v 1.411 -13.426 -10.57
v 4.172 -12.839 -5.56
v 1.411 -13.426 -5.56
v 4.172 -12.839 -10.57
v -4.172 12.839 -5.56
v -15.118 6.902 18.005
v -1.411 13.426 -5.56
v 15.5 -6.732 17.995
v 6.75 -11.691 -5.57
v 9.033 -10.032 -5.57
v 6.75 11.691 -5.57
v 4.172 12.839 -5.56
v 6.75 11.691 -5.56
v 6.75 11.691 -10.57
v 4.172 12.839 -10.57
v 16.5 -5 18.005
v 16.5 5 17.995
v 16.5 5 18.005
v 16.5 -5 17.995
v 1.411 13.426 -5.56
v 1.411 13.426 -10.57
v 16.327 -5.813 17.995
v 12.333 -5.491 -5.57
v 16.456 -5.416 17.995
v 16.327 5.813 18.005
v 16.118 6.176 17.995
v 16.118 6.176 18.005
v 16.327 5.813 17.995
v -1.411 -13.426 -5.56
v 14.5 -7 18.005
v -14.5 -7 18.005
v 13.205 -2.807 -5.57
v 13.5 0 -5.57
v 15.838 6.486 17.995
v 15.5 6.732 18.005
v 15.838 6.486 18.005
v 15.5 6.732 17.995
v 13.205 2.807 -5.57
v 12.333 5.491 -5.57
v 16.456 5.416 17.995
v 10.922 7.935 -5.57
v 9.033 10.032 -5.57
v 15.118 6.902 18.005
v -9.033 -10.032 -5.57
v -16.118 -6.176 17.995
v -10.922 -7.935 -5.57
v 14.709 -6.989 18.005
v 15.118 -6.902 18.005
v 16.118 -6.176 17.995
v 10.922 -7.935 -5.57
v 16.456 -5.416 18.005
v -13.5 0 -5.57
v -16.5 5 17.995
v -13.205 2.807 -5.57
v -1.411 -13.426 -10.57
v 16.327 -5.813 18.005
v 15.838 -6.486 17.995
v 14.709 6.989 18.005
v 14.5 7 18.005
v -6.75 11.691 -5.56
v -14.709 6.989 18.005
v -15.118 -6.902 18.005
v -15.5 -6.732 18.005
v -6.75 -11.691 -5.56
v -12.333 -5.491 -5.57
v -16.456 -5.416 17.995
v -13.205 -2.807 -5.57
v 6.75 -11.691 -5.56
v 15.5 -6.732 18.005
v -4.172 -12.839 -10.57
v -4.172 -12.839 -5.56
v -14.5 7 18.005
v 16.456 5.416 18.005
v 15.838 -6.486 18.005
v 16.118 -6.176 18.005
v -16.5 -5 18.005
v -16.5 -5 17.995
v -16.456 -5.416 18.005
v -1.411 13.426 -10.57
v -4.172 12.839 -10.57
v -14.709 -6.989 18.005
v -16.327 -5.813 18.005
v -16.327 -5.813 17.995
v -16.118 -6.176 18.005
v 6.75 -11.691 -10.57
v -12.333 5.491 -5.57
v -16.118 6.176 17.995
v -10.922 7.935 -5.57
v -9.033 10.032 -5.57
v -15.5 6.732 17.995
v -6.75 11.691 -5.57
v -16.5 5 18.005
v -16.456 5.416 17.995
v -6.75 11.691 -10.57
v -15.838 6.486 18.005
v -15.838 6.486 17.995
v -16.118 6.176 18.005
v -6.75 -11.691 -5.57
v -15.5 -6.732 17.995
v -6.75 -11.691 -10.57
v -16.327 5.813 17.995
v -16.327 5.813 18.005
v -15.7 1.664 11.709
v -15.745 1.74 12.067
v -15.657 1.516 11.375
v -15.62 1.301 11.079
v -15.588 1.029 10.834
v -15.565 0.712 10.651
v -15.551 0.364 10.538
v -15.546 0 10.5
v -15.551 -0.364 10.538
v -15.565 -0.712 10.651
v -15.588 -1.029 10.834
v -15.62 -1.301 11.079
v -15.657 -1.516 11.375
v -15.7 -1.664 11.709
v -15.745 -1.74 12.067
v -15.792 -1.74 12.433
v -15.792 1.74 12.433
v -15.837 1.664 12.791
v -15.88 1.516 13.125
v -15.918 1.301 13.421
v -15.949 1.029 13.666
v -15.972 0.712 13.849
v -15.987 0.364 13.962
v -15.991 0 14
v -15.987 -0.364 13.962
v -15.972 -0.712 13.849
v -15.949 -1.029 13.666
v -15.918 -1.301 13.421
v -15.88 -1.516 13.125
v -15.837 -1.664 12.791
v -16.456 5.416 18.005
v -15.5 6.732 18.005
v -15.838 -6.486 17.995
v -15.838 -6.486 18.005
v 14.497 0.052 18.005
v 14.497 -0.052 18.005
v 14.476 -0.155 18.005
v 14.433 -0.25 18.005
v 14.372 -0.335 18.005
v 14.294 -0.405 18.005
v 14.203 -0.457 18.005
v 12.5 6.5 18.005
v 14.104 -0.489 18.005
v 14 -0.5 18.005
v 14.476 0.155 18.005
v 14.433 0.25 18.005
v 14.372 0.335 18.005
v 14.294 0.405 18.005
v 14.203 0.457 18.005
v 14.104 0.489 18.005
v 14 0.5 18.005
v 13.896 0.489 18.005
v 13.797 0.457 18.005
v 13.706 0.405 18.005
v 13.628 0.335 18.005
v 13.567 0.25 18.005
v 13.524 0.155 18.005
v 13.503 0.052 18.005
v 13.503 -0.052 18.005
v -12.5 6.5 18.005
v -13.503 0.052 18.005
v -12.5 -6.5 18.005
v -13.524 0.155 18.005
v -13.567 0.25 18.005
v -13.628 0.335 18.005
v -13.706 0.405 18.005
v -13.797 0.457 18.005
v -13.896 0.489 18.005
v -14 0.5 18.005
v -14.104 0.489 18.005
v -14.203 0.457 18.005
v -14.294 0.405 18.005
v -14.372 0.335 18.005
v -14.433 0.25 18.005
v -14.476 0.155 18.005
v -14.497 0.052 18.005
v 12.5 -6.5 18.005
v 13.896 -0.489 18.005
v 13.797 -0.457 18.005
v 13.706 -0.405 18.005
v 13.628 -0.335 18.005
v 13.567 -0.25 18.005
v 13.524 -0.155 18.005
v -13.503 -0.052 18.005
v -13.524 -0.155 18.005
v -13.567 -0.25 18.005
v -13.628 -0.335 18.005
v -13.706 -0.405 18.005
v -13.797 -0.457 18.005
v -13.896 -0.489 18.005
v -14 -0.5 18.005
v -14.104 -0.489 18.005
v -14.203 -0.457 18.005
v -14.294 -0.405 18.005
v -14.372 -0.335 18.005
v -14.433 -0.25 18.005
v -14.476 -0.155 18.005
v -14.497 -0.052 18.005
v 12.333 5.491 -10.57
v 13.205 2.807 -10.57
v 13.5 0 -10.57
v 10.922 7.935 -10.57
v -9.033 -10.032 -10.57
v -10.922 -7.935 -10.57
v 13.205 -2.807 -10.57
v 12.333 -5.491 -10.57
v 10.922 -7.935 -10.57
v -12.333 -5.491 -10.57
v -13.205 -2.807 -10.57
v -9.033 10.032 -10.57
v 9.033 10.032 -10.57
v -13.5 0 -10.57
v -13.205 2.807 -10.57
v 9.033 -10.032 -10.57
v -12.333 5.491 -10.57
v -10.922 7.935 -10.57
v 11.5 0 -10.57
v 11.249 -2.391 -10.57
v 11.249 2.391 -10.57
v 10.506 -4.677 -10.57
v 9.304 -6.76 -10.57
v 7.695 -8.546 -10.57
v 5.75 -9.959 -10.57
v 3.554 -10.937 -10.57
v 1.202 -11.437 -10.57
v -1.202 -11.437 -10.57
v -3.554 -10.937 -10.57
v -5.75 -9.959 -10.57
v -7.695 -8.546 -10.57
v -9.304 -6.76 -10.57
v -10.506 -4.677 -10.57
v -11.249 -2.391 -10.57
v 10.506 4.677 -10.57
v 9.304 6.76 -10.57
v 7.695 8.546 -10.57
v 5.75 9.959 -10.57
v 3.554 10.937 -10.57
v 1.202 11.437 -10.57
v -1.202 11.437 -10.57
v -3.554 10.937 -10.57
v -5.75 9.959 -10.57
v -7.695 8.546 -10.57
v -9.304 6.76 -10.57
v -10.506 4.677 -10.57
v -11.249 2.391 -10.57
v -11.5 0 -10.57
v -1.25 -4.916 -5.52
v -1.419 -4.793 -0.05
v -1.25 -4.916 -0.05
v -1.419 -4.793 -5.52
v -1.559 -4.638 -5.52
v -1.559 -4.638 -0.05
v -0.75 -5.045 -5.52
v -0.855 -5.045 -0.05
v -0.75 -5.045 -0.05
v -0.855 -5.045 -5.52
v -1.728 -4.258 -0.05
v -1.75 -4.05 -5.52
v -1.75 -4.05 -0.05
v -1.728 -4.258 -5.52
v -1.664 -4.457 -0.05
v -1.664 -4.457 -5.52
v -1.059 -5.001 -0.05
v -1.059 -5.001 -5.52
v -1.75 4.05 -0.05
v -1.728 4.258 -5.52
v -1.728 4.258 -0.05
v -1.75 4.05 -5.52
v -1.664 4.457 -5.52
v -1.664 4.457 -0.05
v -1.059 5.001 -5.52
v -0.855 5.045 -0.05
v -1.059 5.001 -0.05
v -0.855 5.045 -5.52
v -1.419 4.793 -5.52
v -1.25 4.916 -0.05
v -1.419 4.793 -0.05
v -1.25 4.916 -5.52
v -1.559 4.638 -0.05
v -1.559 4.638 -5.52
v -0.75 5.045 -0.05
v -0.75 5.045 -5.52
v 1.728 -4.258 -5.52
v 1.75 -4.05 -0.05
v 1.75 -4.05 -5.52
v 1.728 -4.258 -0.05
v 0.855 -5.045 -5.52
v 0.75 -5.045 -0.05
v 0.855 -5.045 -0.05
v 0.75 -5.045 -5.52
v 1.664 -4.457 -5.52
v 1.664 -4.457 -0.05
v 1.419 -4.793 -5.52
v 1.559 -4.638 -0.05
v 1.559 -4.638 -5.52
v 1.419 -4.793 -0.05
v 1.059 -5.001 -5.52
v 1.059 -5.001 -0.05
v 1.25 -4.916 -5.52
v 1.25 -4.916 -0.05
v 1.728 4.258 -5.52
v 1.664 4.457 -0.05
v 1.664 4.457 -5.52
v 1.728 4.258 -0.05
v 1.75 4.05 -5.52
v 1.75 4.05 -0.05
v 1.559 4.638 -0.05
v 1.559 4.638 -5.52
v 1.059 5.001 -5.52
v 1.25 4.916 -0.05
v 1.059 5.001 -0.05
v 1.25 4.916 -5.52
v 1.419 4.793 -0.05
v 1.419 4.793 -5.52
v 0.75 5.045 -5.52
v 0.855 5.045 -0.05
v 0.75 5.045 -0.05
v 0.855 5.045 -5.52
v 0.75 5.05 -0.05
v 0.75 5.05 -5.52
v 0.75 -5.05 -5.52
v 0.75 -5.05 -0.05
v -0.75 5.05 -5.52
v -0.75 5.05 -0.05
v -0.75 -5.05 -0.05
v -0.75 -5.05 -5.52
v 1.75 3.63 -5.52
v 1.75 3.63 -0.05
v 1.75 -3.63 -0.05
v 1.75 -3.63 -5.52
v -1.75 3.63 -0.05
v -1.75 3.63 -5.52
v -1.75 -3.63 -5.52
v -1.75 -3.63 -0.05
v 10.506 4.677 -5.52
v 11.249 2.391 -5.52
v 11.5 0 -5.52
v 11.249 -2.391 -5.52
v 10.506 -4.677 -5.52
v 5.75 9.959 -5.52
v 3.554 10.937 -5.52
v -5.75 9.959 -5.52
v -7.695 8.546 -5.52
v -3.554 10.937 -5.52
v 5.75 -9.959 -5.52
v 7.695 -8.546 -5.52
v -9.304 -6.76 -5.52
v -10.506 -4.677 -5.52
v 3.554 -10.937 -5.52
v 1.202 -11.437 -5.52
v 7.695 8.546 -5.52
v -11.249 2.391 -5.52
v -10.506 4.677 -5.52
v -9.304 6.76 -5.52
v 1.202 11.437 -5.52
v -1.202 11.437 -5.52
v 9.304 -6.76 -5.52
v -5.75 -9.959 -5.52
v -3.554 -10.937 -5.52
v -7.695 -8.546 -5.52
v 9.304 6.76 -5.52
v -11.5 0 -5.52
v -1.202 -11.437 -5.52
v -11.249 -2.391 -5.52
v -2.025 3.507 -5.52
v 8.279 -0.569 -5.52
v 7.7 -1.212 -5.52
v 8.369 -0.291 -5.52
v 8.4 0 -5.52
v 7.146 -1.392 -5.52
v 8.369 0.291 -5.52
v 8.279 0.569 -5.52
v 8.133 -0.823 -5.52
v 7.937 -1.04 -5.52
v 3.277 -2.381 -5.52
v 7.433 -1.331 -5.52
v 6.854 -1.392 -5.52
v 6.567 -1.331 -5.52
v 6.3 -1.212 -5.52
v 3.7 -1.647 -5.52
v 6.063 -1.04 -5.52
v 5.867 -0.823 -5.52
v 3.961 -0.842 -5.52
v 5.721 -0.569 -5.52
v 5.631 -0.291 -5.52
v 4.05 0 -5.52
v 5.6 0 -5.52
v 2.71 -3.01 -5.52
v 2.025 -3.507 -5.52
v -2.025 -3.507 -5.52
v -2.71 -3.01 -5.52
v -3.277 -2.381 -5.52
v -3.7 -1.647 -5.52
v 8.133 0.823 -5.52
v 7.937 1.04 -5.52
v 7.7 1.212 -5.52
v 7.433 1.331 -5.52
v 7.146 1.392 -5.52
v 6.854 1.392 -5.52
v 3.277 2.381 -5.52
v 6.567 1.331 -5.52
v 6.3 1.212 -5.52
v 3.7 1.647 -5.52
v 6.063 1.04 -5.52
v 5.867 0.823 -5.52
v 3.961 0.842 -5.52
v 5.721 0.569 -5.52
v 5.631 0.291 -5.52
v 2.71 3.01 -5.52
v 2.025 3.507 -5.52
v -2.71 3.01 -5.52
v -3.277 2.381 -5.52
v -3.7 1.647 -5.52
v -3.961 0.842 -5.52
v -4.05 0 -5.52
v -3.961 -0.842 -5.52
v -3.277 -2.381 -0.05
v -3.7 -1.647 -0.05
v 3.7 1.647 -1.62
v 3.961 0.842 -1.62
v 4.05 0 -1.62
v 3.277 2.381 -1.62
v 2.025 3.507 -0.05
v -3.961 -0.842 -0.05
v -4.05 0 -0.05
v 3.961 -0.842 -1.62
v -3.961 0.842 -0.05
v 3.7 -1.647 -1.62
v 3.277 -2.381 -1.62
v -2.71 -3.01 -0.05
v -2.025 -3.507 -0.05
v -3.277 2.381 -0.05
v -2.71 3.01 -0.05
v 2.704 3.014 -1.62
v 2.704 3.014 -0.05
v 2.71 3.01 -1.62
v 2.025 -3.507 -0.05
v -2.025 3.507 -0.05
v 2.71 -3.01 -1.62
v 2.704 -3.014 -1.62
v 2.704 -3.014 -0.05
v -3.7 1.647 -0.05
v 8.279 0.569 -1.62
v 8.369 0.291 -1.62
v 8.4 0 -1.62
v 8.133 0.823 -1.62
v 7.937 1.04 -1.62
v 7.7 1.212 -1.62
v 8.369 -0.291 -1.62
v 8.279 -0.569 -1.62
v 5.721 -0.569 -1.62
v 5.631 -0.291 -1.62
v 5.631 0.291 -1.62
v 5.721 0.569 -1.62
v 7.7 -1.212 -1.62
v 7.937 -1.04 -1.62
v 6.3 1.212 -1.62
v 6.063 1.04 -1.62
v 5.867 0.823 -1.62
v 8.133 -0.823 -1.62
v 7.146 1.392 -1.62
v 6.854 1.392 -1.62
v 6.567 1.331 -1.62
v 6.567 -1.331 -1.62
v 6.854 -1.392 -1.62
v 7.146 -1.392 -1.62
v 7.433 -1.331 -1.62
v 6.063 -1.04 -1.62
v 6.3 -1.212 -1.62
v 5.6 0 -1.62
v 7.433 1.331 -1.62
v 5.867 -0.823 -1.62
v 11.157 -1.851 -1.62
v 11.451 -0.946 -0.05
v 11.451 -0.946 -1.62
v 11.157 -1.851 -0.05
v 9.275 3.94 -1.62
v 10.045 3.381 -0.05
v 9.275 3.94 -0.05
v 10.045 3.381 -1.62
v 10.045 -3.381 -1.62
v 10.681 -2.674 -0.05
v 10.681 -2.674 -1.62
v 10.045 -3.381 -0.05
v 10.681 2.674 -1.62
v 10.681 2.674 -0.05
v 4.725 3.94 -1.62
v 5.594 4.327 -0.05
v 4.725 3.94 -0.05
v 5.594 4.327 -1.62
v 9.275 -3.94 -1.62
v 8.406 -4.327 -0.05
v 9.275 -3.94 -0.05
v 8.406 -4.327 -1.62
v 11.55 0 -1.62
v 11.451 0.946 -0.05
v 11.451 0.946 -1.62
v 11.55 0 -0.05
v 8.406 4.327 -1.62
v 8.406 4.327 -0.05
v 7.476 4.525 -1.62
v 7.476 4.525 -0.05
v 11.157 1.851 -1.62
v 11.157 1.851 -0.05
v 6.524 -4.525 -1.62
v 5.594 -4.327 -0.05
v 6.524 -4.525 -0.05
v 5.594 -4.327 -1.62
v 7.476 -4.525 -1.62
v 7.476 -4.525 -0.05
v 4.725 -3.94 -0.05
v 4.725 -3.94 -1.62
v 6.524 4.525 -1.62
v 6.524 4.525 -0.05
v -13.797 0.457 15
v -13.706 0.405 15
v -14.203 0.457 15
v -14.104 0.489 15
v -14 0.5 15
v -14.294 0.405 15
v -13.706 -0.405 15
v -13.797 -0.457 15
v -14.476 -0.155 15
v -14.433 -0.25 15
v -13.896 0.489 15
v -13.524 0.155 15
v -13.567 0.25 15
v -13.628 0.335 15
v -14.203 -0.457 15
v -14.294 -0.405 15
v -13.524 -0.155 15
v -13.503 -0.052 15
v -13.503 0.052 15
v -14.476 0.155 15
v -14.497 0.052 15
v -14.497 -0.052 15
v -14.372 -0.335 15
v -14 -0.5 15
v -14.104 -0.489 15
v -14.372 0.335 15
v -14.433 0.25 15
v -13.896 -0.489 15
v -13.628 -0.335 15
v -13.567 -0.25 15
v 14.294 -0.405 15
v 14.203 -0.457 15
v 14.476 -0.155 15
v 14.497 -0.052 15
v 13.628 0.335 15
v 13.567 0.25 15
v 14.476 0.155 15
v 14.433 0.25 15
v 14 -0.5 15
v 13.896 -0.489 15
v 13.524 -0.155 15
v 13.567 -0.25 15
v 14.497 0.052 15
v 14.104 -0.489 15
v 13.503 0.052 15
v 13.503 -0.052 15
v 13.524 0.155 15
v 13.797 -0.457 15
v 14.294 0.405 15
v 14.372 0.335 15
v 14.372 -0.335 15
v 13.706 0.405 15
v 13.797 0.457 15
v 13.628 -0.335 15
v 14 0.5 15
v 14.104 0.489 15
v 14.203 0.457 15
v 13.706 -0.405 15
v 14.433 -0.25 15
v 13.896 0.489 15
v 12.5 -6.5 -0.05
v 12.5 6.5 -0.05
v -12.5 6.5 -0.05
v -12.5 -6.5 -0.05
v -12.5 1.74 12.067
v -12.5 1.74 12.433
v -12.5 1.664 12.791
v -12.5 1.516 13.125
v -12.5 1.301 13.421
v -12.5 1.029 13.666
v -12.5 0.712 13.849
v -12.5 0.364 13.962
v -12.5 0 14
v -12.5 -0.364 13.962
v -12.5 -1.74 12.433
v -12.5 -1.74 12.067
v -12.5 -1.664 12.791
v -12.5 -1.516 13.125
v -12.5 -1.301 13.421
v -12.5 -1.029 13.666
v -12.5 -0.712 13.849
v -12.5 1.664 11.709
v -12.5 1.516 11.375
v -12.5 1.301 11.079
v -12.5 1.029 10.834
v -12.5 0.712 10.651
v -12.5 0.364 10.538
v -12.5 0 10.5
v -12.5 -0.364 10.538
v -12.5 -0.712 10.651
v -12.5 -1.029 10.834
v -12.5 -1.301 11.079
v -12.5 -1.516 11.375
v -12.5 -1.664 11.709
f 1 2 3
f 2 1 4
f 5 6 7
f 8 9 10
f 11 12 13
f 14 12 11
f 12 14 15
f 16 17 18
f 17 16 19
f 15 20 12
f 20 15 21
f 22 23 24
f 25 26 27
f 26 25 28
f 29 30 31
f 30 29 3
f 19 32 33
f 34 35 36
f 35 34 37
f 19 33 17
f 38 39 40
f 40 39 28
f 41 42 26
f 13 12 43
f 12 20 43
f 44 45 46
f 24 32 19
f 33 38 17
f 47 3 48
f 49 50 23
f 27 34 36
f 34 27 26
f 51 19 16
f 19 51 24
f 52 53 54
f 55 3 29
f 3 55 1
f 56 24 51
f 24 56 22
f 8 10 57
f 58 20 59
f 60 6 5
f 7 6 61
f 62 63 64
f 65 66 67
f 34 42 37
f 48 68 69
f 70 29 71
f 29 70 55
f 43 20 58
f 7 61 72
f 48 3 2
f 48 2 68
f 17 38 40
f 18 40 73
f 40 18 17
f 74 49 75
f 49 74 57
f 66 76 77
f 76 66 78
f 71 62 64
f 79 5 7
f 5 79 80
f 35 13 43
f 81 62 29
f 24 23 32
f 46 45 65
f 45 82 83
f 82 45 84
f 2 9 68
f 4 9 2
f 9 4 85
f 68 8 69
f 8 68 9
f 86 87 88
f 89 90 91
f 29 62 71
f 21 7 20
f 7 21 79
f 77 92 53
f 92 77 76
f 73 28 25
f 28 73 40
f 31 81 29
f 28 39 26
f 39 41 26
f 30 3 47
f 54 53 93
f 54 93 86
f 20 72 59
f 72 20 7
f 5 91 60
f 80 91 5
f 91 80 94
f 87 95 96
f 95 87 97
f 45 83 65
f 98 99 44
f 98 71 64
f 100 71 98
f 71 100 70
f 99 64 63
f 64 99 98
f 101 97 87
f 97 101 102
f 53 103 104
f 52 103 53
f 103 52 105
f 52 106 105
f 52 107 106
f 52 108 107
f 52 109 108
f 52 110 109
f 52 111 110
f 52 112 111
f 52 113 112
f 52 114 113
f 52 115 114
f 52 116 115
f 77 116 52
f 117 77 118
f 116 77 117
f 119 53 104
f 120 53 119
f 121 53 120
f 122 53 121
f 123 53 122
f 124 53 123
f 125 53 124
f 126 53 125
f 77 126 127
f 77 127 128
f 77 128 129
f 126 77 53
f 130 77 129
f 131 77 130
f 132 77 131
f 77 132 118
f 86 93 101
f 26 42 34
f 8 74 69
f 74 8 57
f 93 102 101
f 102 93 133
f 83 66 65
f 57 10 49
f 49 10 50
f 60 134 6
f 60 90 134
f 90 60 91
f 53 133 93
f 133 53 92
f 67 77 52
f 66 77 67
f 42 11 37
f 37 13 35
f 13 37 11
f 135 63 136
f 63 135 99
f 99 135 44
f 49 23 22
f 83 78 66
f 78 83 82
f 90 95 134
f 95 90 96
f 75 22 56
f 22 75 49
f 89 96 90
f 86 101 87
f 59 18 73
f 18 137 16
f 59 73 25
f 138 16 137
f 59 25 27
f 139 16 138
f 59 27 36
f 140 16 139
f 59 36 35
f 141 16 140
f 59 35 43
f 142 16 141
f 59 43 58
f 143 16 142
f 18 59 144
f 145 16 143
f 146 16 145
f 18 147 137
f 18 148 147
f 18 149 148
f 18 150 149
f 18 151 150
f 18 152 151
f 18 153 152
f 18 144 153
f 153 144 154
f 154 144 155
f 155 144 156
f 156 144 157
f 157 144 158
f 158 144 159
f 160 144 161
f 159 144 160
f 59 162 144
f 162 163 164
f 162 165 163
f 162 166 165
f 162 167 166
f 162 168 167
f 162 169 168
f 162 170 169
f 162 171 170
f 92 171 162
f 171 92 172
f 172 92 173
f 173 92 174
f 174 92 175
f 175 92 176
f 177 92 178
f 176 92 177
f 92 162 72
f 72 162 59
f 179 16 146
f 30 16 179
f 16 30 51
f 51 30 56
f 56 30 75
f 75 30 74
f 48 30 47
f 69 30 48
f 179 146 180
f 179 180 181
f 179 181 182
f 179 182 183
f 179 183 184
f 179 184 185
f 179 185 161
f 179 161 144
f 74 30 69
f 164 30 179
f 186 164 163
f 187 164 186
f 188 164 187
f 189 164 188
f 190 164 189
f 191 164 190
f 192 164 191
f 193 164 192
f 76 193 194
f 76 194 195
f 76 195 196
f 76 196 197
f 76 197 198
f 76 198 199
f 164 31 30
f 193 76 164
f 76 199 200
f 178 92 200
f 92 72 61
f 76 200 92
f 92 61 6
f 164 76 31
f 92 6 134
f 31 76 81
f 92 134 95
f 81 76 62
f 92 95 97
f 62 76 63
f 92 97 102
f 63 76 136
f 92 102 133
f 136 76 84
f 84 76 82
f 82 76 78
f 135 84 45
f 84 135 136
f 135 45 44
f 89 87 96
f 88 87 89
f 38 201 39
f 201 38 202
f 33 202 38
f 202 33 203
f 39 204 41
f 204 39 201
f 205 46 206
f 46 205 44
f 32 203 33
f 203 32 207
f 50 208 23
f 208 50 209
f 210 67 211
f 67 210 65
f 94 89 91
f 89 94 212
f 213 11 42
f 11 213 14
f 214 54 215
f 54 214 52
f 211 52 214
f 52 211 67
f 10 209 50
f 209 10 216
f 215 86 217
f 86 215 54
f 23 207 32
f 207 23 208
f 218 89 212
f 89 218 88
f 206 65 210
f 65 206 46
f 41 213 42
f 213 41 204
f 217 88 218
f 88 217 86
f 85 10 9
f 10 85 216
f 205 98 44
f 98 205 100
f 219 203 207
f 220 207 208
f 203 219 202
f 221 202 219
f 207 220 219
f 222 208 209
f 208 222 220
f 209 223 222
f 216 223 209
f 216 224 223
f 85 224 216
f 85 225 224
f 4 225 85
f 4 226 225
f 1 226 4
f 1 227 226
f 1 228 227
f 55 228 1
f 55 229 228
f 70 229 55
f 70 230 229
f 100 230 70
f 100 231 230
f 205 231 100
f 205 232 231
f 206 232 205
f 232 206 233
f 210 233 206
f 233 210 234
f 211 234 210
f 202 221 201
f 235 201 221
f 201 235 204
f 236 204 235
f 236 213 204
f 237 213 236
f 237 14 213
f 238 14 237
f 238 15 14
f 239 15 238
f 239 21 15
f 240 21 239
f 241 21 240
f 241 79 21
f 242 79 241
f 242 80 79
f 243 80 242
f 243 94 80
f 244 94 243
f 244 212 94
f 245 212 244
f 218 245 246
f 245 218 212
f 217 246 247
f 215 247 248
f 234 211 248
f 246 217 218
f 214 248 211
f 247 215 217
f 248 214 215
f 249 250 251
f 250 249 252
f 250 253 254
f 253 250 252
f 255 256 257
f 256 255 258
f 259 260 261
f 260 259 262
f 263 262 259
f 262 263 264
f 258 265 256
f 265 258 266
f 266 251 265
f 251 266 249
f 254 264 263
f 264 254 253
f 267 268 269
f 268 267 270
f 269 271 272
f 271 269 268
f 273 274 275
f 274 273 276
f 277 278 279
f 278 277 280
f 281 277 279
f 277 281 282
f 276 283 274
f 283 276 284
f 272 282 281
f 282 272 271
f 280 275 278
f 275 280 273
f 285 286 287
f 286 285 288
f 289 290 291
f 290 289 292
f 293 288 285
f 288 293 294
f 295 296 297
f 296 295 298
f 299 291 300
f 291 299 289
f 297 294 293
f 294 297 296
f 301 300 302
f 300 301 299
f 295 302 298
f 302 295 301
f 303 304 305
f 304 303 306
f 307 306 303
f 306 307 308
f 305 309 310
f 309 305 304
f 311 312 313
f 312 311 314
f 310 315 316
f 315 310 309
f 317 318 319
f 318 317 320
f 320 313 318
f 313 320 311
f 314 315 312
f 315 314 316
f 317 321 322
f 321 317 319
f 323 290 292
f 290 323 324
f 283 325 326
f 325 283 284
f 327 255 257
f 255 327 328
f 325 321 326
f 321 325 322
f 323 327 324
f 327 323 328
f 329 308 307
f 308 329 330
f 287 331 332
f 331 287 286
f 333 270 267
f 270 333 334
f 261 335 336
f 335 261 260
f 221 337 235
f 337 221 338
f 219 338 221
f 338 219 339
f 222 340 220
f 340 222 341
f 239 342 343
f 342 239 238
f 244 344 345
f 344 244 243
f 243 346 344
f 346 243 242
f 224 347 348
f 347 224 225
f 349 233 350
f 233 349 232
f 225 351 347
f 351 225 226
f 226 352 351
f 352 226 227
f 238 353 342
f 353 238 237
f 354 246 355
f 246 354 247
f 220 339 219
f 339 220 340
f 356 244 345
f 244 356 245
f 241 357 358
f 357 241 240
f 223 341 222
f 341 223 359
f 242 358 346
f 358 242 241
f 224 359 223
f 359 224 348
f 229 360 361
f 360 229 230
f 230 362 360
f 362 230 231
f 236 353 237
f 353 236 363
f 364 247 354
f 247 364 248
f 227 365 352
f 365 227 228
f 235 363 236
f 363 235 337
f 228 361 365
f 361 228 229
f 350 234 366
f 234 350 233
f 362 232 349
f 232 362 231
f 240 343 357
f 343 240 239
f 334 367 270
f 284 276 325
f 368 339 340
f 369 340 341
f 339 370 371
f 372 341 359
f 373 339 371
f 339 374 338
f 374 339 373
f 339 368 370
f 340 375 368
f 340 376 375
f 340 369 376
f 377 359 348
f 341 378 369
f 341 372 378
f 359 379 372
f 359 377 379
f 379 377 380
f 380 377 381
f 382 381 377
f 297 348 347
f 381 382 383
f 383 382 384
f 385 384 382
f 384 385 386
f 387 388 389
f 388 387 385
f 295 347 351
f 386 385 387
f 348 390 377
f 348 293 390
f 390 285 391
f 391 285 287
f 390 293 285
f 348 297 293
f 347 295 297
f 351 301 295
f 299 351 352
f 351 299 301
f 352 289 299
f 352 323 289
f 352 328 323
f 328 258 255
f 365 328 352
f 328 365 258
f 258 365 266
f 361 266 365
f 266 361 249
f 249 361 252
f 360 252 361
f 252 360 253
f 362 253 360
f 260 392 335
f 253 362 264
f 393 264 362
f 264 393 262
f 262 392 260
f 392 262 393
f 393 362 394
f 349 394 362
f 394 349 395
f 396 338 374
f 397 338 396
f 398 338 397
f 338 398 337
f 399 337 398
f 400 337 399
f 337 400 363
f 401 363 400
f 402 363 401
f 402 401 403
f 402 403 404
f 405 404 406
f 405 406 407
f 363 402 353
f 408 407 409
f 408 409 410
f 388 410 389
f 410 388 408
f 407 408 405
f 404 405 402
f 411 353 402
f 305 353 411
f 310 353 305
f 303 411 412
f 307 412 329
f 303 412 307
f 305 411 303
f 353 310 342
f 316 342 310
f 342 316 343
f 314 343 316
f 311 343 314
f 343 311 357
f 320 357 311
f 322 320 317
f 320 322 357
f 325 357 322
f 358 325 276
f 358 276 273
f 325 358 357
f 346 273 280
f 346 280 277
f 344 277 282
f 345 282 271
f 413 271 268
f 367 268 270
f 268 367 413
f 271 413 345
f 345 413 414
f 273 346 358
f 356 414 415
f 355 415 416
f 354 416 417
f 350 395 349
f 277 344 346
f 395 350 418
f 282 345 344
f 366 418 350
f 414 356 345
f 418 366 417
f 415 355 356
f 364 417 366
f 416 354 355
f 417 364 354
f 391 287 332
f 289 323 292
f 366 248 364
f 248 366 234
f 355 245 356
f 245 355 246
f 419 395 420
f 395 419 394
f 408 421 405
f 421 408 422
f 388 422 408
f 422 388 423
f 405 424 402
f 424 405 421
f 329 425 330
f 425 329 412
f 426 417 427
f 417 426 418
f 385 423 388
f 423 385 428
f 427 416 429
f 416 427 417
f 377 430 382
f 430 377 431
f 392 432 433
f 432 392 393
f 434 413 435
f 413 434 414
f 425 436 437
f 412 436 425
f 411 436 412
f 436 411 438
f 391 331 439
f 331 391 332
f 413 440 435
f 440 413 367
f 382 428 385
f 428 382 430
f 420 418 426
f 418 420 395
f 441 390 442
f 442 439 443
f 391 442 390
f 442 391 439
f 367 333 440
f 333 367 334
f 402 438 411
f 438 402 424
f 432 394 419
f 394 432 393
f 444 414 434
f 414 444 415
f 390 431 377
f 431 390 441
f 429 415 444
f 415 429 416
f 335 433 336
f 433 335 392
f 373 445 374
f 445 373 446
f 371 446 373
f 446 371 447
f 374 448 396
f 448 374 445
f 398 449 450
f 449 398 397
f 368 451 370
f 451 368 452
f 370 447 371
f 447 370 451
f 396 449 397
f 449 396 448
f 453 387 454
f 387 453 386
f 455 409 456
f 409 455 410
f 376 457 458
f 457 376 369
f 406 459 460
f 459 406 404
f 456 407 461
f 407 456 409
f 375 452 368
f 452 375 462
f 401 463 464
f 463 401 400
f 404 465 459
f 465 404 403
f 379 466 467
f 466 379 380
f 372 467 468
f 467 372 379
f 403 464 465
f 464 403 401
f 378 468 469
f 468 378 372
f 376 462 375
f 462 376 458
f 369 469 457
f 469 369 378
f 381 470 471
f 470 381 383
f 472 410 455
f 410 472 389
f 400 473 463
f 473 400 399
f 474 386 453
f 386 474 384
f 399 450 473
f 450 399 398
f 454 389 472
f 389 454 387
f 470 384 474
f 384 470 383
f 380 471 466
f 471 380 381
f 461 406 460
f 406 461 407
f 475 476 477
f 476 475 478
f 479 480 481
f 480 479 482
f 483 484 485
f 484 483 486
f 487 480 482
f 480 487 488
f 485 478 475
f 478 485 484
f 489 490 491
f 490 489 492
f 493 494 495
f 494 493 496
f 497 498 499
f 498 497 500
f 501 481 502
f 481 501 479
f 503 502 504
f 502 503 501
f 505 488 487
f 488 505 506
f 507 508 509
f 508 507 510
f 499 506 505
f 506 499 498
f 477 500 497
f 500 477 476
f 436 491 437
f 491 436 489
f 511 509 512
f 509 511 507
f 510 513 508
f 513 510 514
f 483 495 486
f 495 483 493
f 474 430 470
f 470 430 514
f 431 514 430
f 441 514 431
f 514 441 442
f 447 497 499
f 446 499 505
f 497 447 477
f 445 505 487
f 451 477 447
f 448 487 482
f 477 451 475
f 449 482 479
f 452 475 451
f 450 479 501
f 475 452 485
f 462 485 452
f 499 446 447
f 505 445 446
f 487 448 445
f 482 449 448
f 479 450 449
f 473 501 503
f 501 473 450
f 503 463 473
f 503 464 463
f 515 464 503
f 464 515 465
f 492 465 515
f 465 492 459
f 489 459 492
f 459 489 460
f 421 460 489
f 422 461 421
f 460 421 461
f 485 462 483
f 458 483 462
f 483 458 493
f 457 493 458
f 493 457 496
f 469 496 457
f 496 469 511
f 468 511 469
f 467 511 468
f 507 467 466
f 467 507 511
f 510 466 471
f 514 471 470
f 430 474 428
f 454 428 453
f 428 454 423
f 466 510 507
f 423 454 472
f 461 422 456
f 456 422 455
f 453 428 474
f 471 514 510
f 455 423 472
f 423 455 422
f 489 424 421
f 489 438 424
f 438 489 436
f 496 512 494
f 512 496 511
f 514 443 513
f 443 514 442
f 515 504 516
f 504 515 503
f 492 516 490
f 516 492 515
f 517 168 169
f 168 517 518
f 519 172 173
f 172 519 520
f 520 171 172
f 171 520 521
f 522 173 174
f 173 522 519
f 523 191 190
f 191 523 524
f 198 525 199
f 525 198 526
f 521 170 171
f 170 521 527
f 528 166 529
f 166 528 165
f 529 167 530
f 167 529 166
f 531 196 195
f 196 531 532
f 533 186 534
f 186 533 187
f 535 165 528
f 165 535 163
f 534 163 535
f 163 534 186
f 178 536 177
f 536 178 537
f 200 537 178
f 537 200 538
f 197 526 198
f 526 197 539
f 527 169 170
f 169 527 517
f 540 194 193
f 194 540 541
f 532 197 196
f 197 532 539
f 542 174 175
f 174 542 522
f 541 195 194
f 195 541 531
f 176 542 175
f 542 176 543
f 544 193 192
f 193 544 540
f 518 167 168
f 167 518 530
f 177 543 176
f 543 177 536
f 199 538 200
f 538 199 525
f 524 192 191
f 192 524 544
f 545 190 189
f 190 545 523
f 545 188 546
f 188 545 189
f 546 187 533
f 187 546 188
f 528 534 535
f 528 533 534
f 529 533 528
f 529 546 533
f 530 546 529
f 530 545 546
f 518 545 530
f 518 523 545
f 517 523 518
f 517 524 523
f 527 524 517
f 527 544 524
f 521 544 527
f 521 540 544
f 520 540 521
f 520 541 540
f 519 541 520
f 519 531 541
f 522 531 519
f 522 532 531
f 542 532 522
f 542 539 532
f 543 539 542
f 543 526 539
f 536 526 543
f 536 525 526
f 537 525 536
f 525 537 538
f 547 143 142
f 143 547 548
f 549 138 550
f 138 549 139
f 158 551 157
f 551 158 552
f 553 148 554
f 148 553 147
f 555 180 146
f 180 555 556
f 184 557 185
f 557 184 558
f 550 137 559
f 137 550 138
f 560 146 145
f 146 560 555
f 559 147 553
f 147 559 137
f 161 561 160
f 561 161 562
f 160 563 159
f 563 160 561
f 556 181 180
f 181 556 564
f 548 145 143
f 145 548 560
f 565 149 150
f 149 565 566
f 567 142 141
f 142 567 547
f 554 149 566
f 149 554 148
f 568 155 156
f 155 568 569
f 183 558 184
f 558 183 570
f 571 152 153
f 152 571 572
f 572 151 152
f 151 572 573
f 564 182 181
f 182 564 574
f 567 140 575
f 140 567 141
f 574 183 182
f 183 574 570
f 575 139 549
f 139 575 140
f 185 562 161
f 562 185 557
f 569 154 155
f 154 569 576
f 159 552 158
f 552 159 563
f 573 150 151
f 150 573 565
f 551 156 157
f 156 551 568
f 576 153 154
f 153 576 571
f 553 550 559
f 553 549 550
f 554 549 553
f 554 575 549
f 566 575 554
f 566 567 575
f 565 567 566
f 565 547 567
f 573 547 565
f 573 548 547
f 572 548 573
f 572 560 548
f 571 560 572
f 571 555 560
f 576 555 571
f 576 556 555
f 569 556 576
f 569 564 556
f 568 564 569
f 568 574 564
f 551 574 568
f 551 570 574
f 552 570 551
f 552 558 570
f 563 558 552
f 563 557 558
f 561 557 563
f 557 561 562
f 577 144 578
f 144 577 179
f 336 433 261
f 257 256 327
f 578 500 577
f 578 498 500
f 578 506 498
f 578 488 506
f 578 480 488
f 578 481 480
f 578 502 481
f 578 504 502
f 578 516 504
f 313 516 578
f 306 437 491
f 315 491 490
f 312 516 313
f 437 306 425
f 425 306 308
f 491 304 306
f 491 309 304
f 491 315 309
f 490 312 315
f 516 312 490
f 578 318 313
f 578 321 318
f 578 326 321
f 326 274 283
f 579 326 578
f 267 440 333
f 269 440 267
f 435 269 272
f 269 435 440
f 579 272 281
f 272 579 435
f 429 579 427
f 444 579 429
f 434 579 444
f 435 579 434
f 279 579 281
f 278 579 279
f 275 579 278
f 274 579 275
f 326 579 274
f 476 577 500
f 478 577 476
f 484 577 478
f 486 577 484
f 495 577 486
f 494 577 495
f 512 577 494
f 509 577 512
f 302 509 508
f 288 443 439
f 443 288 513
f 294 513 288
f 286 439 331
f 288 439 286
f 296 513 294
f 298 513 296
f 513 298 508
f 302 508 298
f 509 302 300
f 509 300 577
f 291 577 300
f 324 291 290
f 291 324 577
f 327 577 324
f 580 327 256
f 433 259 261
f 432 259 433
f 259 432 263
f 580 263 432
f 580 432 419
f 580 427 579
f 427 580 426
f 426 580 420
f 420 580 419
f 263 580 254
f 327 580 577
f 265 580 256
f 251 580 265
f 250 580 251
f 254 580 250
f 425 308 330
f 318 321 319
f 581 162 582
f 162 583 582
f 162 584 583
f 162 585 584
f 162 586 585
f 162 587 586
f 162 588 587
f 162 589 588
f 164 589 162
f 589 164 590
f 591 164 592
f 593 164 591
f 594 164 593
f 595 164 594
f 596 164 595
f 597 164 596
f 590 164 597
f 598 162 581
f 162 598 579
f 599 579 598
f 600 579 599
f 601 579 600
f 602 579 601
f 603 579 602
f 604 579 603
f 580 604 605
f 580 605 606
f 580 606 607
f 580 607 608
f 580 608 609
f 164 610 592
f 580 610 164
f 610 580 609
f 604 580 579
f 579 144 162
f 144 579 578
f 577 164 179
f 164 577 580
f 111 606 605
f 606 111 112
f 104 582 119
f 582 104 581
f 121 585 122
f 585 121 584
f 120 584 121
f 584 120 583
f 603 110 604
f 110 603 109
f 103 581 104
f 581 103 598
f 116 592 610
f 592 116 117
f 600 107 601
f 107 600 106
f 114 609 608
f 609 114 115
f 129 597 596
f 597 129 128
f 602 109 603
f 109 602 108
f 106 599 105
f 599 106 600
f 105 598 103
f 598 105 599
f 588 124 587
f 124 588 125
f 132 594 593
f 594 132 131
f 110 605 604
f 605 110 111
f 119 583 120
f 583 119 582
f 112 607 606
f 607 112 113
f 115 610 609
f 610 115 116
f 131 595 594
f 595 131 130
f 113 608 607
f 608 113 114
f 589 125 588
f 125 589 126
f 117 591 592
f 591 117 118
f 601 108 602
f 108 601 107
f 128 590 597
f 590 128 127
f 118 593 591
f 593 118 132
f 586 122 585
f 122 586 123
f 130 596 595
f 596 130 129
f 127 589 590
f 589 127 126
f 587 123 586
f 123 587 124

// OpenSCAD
include <MCAD/nuts_and_bolts.scad>
include <MCAD/boxes.scad>

D=23; //trunk body diameter
sw=3; //screw diameter
t=2; //wall thick
s=5; //sink
wt=1.57; //trunk wire thick
wd=4.6; //trunk wire connector ring inner diameter
wD=8.1; //trunk wire connector ring outer diameter
w=5.5; //leave space for wire out
vd=14; //servo mount diameter
to=0.05; //screw tolerance

servoSize = [23,12,16];
servoLength = 33;
servoSpace = 2;
servoScrewL = 3;
servoScrewD = 1;

motorWireD = 3.5;
motorWireZ = 4;

$fs=0.05;

h=2*t+wt+s; //overall height
R=D/2+t; //outer radius


difference() {
    union() {
        hull() {
            translate([0,0,-h+s]) cylinder(r=R,h=0.01);
            translate([0,0,servoSize.z+servoSpace])   
                roundedBox(size=[servoLength,servoSize.y+2,0.01],radius=2,sidesonly=true);
        }
        translate([0,0,-h])  cylinder(r=R,h=s);
    }
    translate([0,0,-h-0.05]) {
        cylinder(r=D/2,h=s+0.1);
        cylinder(r=wD/2,h=h+0.1);
        roundedBox(size=[3.5,wD+2,2*h+0.1],radius=1,sidesonly=true);
        translate([vd/2,0,0]) cylinder(r=sw/2-0.1,h=h+0.1);
        translate([vd/2,0,h-wt]) hull() {
            cylinder(r=wD/2+0.5,h=wt+0.1);
            translate([-vd/2,0,0]) cylinder(r=wD/5,h=wt+0.1);
        }
    }
    translate([0,0,servoSize.z/2+servoSpace]) cube(servoSize+[2,1,2*servoSpace+0.1],center=true);
    for(a=[90:180:270]) {
        rotate([0,0,a]) {
            translate([0,servoLength/2-(servoLength-servoSize.x)/4,servoSize.z+servoSpace-servoScrewL]) 
                cylinder(r=servoScrewD/2,h=servoScrewL+0.05);
        }
    }
    translate([-R,0,servoSize.z+servoSpace-motorWireZ-motorWireD/2]) rotate([0,90,0]) cylinder(r=motorWireD/2,h=10,center=true);
}
